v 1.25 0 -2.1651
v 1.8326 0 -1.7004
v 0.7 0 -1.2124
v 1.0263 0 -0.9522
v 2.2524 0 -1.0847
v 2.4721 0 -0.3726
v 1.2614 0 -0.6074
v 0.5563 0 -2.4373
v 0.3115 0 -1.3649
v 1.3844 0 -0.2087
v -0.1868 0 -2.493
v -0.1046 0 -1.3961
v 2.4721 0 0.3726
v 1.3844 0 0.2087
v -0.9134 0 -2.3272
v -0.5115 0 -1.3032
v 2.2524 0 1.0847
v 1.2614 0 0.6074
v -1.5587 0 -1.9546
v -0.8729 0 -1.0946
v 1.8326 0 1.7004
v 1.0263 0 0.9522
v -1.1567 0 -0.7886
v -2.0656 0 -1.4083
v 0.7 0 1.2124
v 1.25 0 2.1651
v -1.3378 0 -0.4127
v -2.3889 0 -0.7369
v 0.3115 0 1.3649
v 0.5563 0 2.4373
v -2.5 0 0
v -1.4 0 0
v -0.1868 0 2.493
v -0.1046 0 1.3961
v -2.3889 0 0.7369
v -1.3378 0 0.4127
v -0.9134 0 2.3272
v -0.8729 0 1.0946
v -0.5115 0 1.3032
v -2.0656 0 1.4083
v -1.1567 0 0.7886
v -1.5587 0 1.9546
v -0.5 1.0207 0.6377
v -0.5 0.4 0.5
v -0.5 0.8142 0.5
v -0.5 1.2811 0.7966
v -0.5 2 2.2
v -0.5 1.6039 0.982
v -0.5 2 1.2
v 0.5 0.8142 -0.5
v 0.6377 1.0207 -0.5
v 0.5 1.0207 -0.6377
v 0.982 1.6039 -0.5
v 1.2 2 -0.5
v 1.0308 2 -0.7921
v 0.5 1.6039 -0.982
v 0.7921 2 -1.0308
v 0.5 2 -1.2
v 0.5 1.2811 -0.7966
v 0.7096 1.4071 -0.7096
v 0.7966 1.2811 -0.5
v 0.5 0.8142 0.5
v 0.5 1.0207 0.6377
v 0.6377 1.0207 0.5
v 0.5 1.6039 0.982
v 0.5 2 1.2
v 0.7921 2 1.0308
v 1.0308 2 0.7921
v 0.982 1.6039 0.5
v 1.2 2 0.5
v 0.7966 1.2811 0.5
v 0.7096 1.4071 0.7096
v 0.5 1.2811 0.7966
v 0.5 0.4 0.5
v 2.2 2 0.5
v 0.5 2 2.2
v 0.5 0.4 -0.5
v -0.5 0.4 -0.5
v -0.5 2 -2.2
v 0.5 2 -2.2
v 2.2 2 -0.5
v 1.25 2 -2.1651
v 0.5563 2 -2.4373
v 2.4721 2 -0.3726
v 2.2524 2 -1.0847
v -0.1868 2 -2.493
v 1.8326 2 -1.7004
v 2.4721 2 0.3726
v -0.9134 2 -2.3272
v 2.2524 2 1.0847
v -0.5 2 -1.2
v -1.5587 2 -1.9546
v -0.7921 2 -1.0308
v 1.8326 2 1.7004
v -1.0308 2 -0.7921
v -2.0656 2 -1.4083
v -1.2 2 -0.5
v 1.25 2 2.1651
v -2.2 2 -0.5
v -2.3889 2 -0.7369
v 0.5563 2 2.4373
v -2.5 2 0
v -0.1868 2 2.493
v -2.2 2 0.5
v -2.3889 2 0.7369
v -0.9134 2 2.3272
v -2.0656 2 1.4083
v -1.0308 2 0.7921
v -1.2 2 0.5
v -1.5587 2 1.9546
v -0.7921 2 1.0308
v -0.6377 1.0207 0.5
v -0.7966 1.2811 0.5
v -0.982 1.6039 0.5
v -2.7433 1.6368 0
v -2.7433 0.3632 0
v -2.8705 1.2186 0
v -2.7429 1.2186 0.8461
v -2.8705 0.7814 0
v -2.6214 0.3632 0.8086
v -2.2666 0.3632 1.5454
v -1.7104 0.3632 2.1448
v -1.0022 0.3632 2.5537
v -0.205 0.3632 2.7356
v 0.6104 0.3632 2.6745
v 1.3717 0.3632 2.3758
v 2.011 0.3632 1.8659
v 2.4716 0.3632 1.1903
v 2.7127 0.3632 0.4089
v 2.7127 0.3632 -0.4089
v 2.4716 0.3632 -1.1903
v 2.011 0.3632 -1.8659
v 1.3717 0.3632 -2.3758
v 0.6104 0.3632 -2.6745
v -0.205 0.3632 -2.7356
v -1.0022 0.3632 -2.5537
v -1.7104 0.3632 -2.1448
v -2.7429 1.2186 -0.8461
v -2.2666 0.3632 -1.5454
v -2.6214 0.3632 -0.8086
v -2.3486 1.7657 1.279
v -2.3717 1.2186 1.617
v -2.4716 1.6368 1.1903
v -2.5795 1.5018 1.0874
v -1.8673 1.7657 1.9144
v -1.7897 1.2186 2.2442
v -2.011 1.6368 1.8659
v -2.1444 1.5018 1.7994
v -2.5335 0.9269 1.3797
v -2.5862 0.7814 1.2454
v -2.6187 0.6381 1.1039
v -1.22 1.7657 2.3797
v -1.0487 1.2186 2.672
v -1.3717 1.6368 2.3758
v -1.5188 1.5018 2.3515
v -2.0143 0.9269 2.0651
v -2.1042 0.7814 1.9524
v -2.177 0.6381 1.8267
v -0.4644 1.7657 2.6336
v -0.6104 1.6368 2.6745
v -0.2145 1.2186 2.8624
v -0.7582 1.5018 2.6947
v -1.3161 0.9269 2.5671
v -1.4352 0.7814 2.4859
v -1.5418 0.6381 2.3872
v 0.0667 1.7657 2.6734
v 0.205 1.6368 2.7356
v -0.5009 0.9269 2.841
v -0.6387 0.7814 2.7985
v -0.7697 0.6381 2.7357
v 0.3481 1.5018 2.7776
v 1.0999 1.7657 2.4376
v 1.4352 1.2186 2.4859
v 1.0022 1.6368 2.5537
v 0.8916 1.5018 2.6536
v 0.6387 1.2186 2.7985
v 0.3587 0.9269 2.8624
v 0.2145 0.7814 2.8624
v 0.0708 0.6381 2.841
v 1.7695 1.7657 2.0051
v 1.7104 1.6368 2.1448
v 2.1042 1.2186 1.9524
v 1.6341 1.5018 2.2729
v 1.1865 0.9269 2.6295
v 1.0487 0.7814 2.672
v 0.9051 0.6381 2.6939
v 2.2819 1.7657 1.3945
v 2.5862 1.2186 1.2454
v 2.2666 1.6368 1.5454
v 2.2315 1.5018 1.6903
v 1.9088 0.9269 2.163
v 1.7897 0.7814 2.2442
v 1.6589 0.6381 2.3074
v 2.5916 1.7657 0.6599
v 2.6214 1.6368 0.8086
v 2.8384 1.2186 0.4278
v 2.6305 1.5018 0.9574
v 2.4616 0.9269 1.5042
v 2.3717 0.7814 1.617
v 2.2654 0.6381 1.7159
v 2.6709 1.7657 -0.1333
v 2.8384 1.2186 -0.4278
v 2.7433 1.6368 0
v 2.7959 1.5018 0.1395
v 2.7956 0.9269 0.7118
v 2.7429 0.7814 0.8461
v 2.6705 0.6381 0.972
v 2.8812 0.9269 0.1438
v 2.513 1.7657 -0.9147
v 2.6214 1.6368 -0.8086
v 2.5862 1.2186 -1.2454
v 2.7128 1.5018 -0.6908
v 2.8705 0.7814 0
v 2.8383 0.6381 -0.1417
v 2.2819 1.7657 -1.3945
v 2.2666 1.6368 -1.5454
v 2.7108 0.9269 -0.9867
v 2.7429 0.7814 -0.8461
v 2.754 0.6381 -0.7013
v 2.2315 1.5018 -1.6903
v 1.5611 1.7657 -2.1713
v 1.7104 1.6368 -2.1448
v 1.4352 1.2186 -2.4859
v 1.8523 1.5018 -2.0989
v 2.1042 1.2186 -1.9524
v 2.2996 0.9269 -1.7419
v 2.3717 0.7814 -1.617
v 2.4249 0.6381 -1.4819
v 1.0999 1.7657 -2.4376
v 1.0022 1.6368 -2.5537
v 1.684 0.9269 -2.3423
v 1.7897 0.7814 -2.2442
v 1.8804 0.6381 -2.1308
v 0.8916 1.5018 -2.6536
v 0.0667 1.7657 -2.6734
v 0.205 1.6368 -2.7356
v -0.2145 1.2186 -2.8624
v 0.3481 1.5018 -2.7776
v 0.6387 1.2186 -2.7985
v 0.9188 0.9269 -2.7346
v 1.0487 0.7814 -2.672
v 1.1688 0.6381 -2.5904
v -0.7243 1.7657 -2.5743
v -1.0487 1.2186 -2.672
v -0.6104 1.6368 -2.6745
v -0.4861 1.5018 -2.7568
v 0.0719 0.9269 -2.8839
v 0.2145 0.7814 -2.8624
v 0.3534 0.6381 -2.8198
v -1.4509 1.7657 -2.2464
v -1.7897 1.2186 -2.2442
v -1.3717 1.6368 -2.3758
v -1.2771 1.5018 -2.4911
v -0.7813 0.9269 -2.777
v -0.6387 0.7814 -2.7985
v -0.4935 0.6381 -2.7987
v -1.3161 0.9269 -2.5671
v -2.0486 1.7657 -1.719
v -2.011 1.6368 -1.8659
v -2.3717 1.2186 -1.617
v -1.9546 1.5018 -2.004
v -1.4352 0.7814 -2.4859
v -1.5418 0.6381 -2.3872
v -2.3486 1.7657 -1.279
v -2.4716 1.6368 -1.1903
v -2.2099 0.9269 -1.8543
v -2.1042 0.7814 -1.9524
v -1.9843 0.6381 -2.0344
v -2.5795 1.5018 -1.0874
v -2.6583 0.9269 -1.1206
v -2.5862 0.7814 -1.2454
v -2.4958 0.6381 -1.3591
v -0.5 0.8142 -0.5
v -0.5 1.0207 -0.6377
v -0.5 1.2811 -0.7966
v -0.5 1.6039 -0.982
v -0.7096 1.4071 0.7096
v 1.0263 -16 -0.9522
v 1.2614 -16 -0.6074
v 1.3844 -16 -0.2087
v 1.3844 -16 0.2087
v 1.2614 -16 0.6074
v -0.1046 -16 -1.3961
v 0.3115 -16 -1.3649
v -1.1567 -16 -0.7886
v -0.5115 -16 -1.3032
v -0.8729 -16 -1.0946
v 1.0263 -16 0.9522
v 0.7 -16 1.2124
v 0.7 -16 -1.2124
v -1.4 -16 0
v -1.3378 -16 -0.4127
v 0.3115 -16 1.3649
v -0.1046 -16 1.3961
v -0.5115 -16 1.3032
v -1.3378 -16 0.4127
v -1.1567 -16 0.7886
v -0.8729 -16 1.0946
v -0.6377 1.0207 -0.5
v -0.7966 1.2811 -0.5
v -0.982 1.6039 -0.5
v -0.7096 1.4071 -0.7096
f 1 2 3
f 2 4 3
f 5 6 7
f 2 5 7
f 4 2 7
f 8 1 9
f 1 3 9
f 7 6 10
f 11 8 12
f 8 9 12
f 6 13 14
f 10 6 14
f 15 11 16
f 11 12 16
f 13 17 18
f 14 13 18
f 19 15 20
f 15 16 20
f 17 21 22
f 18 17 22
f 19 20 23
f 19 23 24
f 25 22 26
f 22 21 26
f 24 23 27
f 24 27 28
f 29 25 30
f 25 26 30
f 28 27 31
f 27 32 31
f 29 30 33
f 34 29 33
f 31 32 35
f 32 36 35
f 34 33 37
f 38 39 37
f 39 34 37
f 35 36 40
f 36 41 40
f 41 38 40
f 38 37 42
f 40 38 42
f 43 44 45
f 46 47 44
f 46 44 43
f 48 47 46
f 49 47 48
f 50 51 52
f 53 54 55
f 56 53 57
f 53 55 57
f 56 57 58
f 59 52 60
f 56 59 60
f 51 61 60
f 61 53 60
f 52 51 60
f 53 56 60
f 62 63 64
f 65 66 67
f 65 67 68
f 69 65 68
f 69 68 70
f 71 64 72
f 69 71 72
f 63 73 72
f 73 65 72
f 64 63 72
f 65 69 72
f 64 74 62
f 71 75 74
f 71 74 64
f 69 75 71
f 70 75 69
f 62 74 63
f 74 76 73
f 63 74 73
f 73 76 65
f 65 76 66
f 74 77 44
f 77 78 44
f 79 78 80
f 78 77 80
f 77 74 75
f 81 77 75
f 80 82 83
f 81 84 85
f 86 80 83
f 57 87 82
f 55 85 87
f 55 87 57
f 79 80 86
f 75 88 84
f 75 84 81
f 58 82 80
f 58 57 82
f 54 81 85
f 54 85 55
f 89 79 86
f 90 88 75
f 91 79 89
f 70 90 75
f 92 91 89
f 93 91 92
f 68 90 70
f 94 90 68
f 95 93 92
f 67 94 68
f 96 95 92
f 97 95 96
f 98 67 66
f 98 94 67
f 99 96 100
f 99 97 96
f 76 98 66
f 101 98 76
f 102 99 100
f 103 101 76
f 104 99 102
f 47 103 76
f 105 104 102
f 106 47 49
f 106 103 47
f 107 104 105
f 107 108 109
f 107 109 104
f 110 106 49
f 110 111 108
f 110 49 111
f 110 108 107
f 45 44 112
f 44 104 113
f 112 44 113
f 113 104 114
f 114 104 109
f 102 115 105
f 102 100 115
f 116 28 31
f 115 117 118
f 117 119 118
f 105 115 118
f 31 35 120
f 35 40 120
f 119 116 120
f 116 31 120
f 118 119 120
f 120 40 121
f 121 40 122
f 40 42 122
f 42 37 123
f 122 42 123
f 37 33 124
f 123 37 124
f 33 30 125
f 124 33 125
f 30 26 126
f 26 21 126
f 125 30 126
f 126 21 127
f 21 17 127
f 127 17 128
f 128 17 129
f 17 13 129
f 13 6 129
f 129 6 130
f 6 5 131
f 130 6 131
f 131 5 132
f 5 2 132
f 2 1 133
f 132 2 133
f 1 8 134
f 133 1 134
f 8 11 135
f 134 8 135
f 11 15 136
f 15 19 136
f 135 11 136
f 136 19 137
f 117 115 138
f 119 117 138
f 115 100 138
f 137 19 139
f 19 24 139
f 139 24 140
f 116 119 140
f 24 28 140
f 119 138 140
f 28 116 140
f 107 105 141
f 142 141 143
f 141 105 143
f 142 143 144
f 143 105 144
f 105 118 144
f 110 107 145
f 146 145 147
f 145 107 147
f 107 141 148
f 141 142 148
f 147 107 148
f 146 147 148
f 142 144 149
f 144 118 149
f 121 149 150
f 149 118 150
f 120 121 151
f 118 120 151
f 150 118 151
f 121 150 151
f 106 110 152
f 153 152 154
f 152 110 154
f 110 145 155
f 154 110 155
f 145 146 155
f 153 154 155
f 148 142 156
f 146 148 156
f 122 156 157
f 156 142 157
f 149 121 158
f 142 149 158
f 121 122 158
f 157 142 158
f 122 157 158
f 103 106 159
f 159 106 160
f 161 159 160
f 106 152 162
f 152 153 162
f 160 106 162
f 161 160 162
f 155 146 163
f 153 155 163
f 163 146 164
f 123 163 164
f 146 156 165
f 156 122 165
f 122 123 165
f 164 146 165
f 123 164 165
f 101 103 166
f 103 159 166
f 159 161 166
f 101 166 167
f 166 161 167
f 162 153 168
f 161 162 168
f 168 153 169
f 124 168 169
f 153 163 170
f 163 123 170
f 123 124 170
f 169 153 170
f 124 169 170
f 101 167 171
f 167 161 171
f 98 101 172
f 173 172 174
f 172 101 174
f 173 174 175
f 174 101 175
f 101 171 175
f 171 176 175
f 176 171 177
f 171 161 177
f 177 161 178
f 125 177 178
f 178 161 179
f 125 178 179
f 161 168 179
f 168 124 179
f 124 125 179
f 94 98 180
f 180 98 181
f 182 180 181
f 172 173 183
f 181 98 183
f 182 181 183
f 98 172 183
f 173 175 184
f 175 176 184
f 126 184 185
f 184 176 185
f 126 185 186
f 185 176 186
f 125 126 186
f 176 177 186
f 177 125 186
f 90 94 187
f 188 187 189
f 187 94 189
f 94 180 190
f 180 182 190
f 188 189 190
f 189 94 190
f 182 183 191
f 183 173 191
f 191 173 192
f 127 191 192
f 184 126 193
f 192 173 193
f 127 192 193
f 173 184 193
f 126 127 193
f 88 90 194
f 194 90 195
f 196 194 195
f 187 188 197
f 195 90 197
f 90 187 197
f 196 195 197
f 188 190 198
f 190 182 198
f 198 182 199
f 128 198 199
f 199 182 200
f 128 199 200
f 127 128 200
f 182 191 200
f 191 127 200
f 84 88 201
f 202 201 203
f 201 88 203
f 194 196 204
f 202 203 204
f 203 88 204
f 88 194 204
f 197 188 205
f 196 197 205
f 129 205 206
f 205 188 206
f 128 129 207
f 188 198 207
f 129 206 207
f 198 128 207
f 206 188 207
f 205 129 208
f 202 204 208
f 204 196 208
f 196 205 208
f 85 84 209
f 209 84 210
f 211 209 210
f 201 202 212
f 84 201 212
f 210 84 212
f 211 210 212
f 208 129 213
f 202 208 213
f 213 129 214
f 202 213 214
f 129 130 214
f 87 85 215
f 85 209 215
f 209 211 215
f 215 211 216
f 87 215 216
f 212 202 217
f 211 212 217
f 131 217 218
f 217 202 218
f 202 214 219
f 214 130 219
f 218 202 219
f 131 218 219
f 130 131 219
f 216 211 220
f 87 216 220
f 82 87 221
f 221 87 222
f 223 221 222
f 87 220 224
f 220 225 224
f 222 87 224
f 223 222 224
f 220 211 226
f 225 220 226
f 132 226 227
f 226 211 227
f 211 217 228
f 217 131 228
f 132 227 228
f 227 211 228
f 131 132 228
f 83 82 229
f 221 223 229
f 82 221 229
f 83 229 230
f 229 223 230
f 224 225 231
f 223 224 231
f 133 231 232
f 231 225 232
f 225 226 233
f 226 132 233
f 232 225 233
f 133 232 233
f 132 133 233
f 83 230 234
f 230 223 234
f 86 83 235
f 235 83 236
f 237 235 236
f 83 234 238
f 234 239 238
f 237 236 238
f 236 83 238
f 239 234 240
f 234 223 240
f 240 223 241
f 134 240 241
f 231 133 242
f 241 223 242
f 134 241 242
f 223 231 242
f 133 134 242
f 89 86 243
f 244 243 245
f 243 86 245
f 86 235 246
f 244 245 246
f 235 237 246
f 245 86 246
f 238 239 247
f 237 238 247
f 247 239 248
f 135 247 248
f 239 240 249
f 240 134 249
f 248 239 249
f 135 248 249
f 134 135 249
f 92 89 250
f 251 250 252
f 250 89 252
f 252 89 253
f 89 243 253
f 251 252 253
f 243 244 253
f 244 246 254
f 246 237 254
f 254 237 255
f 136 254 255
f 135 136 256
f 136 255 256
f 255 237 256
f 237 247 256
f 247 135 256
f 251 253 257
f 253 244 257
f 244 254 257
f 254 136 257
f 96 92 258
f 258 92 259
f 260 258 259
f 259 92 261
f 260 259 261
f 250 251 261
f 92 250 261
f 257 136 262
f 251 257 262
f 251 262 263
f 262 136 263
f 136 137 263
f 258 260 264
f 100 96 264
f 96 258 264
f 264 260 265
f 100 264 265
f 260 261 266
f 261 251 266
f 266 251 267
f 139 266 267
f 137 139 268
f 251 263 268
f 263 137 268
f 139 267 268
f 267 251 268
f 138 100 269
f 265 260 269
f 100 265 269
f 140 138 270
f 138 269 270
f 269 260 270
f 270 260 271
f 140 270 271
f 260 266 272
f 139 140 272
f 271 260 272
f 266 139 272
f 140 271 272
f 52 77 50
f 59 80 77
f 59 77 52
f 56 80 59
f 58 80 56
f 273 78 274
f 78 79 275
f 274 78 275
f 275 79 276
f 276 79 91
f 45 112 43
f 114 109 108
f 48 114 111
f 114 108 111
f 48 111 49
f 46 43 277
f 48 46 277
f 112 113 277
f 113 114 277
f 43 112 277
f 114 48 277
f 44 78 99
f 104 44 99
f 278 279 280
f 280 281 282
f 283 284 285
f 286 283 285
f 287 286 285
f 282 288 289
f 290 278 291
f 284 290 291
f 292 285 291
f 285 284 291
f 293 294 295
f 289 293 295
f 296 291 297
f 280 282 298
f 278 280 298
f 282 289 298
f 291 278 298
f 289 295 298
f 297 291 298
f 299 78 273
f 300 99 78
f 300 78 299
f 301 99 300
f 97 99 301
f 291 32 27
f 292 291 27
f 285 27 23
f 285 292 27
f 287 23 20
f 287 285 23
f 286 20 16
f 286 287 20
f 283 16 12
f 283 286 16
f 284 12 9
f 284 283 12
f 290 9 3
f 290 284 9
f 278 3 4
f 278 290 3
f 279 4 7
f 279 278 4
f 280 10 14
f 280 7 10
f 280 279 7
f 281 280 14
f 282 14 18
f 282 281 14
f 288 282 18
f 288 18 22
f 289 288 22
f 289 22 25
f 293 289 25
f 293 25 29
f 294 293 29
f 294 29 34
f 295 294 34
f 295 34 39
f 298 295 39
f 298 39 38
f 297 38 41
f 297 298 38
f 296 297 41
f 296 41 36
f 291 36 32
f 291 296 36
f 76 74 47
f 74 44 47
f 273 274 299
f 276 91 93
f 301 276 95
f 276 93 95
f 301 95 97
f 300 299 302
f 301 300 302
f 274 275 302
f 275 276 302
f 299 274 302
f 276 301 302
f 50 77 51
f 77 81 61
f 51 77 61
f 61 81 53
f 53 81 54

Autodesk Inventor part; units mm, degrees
ref_plane "YZ Plane" through (0, 0, 0) normal (1, 0, 0) x (0, 1, 0)
ref_plane "XZ Plane" through (0, 0, 0) normal (0, 1, 0) x (-1, 0, 0)
ref_plane "XY Plane" through (0, 0, 0) normal (0, 0, 1) x (1, 0, 0)
sketch "Эскиз3" plane through (0, 0, 0) normal (0, 0, 1) x (1, 0, 0)
  line L0 (-1.4, 0) -> (-1.4, -16)
  line L1 (-1.4, -16) -> (0, -16)
  line L2 (0, -16) -> (0, 2)
  line L3 (-1.4, 0) -> (-2.5, 0)
  arc A0 (-2.5, 2) -> (-2.5, 0) centre (-1.4, 1) ccw
  line L4 (-1.3, 2) -> (-0.5, 0.4)
  line L5 (-0.5, 0.4) -> (0, 0.4)
  line L6 (-2.5, 2) -> (-1.3, 2)
  point P0 (0, 0)
  dimension "d4" = 2.8
  dimension "d6" = 1
  dimension "d7" = 5
  dimension "d8" = 16
  dimension "d10" = 2
  dimension "d12" = 2.6
  dimension "d13" = 0.4
  dimension "d14" = 1
revolve "Вращение1" add sketch "Эскиз3" angle 360 about axis through (0, -16, 0) along (0, 1, 0)
sketch "Эскиз5" plane through (0, 0, 0) normal (0, 0, 1) x (1, 0, 0)
  line L0 (0.5, 0.4) -> (-0.5, 0.4) projected
  line L1 (-0.5, 0.4) -> (-2.2, 2)
  line L2 (2.5, 2) -> (-2.5, 2) projected
  line L3 (-2.2, 2) -> (0, 2)
  line L4 (1.3, 2) -> (-1.3, 2) projected
  line L5 (0, 0.4) -> (-0.5, 0.4)
  line L6 (0, 0.4) -> (0, 2)
  point P0 (0, 0)
  dimension "d15" = 2.2
extrude "Выдавливание2" cut sketch "Эскиз5" along normal mid plane 1
pattern_circular "Круговой массив1" count 4 over 360 about axis through (0, -10, 0) along (0, 1, 0) of "Выдавливание2"
thread "Резьба1" size "M3x0.5" class "6g" standard "ANSI Metric M Profile" full length
properties part number "M3x16" material "Сталь, литейная"
